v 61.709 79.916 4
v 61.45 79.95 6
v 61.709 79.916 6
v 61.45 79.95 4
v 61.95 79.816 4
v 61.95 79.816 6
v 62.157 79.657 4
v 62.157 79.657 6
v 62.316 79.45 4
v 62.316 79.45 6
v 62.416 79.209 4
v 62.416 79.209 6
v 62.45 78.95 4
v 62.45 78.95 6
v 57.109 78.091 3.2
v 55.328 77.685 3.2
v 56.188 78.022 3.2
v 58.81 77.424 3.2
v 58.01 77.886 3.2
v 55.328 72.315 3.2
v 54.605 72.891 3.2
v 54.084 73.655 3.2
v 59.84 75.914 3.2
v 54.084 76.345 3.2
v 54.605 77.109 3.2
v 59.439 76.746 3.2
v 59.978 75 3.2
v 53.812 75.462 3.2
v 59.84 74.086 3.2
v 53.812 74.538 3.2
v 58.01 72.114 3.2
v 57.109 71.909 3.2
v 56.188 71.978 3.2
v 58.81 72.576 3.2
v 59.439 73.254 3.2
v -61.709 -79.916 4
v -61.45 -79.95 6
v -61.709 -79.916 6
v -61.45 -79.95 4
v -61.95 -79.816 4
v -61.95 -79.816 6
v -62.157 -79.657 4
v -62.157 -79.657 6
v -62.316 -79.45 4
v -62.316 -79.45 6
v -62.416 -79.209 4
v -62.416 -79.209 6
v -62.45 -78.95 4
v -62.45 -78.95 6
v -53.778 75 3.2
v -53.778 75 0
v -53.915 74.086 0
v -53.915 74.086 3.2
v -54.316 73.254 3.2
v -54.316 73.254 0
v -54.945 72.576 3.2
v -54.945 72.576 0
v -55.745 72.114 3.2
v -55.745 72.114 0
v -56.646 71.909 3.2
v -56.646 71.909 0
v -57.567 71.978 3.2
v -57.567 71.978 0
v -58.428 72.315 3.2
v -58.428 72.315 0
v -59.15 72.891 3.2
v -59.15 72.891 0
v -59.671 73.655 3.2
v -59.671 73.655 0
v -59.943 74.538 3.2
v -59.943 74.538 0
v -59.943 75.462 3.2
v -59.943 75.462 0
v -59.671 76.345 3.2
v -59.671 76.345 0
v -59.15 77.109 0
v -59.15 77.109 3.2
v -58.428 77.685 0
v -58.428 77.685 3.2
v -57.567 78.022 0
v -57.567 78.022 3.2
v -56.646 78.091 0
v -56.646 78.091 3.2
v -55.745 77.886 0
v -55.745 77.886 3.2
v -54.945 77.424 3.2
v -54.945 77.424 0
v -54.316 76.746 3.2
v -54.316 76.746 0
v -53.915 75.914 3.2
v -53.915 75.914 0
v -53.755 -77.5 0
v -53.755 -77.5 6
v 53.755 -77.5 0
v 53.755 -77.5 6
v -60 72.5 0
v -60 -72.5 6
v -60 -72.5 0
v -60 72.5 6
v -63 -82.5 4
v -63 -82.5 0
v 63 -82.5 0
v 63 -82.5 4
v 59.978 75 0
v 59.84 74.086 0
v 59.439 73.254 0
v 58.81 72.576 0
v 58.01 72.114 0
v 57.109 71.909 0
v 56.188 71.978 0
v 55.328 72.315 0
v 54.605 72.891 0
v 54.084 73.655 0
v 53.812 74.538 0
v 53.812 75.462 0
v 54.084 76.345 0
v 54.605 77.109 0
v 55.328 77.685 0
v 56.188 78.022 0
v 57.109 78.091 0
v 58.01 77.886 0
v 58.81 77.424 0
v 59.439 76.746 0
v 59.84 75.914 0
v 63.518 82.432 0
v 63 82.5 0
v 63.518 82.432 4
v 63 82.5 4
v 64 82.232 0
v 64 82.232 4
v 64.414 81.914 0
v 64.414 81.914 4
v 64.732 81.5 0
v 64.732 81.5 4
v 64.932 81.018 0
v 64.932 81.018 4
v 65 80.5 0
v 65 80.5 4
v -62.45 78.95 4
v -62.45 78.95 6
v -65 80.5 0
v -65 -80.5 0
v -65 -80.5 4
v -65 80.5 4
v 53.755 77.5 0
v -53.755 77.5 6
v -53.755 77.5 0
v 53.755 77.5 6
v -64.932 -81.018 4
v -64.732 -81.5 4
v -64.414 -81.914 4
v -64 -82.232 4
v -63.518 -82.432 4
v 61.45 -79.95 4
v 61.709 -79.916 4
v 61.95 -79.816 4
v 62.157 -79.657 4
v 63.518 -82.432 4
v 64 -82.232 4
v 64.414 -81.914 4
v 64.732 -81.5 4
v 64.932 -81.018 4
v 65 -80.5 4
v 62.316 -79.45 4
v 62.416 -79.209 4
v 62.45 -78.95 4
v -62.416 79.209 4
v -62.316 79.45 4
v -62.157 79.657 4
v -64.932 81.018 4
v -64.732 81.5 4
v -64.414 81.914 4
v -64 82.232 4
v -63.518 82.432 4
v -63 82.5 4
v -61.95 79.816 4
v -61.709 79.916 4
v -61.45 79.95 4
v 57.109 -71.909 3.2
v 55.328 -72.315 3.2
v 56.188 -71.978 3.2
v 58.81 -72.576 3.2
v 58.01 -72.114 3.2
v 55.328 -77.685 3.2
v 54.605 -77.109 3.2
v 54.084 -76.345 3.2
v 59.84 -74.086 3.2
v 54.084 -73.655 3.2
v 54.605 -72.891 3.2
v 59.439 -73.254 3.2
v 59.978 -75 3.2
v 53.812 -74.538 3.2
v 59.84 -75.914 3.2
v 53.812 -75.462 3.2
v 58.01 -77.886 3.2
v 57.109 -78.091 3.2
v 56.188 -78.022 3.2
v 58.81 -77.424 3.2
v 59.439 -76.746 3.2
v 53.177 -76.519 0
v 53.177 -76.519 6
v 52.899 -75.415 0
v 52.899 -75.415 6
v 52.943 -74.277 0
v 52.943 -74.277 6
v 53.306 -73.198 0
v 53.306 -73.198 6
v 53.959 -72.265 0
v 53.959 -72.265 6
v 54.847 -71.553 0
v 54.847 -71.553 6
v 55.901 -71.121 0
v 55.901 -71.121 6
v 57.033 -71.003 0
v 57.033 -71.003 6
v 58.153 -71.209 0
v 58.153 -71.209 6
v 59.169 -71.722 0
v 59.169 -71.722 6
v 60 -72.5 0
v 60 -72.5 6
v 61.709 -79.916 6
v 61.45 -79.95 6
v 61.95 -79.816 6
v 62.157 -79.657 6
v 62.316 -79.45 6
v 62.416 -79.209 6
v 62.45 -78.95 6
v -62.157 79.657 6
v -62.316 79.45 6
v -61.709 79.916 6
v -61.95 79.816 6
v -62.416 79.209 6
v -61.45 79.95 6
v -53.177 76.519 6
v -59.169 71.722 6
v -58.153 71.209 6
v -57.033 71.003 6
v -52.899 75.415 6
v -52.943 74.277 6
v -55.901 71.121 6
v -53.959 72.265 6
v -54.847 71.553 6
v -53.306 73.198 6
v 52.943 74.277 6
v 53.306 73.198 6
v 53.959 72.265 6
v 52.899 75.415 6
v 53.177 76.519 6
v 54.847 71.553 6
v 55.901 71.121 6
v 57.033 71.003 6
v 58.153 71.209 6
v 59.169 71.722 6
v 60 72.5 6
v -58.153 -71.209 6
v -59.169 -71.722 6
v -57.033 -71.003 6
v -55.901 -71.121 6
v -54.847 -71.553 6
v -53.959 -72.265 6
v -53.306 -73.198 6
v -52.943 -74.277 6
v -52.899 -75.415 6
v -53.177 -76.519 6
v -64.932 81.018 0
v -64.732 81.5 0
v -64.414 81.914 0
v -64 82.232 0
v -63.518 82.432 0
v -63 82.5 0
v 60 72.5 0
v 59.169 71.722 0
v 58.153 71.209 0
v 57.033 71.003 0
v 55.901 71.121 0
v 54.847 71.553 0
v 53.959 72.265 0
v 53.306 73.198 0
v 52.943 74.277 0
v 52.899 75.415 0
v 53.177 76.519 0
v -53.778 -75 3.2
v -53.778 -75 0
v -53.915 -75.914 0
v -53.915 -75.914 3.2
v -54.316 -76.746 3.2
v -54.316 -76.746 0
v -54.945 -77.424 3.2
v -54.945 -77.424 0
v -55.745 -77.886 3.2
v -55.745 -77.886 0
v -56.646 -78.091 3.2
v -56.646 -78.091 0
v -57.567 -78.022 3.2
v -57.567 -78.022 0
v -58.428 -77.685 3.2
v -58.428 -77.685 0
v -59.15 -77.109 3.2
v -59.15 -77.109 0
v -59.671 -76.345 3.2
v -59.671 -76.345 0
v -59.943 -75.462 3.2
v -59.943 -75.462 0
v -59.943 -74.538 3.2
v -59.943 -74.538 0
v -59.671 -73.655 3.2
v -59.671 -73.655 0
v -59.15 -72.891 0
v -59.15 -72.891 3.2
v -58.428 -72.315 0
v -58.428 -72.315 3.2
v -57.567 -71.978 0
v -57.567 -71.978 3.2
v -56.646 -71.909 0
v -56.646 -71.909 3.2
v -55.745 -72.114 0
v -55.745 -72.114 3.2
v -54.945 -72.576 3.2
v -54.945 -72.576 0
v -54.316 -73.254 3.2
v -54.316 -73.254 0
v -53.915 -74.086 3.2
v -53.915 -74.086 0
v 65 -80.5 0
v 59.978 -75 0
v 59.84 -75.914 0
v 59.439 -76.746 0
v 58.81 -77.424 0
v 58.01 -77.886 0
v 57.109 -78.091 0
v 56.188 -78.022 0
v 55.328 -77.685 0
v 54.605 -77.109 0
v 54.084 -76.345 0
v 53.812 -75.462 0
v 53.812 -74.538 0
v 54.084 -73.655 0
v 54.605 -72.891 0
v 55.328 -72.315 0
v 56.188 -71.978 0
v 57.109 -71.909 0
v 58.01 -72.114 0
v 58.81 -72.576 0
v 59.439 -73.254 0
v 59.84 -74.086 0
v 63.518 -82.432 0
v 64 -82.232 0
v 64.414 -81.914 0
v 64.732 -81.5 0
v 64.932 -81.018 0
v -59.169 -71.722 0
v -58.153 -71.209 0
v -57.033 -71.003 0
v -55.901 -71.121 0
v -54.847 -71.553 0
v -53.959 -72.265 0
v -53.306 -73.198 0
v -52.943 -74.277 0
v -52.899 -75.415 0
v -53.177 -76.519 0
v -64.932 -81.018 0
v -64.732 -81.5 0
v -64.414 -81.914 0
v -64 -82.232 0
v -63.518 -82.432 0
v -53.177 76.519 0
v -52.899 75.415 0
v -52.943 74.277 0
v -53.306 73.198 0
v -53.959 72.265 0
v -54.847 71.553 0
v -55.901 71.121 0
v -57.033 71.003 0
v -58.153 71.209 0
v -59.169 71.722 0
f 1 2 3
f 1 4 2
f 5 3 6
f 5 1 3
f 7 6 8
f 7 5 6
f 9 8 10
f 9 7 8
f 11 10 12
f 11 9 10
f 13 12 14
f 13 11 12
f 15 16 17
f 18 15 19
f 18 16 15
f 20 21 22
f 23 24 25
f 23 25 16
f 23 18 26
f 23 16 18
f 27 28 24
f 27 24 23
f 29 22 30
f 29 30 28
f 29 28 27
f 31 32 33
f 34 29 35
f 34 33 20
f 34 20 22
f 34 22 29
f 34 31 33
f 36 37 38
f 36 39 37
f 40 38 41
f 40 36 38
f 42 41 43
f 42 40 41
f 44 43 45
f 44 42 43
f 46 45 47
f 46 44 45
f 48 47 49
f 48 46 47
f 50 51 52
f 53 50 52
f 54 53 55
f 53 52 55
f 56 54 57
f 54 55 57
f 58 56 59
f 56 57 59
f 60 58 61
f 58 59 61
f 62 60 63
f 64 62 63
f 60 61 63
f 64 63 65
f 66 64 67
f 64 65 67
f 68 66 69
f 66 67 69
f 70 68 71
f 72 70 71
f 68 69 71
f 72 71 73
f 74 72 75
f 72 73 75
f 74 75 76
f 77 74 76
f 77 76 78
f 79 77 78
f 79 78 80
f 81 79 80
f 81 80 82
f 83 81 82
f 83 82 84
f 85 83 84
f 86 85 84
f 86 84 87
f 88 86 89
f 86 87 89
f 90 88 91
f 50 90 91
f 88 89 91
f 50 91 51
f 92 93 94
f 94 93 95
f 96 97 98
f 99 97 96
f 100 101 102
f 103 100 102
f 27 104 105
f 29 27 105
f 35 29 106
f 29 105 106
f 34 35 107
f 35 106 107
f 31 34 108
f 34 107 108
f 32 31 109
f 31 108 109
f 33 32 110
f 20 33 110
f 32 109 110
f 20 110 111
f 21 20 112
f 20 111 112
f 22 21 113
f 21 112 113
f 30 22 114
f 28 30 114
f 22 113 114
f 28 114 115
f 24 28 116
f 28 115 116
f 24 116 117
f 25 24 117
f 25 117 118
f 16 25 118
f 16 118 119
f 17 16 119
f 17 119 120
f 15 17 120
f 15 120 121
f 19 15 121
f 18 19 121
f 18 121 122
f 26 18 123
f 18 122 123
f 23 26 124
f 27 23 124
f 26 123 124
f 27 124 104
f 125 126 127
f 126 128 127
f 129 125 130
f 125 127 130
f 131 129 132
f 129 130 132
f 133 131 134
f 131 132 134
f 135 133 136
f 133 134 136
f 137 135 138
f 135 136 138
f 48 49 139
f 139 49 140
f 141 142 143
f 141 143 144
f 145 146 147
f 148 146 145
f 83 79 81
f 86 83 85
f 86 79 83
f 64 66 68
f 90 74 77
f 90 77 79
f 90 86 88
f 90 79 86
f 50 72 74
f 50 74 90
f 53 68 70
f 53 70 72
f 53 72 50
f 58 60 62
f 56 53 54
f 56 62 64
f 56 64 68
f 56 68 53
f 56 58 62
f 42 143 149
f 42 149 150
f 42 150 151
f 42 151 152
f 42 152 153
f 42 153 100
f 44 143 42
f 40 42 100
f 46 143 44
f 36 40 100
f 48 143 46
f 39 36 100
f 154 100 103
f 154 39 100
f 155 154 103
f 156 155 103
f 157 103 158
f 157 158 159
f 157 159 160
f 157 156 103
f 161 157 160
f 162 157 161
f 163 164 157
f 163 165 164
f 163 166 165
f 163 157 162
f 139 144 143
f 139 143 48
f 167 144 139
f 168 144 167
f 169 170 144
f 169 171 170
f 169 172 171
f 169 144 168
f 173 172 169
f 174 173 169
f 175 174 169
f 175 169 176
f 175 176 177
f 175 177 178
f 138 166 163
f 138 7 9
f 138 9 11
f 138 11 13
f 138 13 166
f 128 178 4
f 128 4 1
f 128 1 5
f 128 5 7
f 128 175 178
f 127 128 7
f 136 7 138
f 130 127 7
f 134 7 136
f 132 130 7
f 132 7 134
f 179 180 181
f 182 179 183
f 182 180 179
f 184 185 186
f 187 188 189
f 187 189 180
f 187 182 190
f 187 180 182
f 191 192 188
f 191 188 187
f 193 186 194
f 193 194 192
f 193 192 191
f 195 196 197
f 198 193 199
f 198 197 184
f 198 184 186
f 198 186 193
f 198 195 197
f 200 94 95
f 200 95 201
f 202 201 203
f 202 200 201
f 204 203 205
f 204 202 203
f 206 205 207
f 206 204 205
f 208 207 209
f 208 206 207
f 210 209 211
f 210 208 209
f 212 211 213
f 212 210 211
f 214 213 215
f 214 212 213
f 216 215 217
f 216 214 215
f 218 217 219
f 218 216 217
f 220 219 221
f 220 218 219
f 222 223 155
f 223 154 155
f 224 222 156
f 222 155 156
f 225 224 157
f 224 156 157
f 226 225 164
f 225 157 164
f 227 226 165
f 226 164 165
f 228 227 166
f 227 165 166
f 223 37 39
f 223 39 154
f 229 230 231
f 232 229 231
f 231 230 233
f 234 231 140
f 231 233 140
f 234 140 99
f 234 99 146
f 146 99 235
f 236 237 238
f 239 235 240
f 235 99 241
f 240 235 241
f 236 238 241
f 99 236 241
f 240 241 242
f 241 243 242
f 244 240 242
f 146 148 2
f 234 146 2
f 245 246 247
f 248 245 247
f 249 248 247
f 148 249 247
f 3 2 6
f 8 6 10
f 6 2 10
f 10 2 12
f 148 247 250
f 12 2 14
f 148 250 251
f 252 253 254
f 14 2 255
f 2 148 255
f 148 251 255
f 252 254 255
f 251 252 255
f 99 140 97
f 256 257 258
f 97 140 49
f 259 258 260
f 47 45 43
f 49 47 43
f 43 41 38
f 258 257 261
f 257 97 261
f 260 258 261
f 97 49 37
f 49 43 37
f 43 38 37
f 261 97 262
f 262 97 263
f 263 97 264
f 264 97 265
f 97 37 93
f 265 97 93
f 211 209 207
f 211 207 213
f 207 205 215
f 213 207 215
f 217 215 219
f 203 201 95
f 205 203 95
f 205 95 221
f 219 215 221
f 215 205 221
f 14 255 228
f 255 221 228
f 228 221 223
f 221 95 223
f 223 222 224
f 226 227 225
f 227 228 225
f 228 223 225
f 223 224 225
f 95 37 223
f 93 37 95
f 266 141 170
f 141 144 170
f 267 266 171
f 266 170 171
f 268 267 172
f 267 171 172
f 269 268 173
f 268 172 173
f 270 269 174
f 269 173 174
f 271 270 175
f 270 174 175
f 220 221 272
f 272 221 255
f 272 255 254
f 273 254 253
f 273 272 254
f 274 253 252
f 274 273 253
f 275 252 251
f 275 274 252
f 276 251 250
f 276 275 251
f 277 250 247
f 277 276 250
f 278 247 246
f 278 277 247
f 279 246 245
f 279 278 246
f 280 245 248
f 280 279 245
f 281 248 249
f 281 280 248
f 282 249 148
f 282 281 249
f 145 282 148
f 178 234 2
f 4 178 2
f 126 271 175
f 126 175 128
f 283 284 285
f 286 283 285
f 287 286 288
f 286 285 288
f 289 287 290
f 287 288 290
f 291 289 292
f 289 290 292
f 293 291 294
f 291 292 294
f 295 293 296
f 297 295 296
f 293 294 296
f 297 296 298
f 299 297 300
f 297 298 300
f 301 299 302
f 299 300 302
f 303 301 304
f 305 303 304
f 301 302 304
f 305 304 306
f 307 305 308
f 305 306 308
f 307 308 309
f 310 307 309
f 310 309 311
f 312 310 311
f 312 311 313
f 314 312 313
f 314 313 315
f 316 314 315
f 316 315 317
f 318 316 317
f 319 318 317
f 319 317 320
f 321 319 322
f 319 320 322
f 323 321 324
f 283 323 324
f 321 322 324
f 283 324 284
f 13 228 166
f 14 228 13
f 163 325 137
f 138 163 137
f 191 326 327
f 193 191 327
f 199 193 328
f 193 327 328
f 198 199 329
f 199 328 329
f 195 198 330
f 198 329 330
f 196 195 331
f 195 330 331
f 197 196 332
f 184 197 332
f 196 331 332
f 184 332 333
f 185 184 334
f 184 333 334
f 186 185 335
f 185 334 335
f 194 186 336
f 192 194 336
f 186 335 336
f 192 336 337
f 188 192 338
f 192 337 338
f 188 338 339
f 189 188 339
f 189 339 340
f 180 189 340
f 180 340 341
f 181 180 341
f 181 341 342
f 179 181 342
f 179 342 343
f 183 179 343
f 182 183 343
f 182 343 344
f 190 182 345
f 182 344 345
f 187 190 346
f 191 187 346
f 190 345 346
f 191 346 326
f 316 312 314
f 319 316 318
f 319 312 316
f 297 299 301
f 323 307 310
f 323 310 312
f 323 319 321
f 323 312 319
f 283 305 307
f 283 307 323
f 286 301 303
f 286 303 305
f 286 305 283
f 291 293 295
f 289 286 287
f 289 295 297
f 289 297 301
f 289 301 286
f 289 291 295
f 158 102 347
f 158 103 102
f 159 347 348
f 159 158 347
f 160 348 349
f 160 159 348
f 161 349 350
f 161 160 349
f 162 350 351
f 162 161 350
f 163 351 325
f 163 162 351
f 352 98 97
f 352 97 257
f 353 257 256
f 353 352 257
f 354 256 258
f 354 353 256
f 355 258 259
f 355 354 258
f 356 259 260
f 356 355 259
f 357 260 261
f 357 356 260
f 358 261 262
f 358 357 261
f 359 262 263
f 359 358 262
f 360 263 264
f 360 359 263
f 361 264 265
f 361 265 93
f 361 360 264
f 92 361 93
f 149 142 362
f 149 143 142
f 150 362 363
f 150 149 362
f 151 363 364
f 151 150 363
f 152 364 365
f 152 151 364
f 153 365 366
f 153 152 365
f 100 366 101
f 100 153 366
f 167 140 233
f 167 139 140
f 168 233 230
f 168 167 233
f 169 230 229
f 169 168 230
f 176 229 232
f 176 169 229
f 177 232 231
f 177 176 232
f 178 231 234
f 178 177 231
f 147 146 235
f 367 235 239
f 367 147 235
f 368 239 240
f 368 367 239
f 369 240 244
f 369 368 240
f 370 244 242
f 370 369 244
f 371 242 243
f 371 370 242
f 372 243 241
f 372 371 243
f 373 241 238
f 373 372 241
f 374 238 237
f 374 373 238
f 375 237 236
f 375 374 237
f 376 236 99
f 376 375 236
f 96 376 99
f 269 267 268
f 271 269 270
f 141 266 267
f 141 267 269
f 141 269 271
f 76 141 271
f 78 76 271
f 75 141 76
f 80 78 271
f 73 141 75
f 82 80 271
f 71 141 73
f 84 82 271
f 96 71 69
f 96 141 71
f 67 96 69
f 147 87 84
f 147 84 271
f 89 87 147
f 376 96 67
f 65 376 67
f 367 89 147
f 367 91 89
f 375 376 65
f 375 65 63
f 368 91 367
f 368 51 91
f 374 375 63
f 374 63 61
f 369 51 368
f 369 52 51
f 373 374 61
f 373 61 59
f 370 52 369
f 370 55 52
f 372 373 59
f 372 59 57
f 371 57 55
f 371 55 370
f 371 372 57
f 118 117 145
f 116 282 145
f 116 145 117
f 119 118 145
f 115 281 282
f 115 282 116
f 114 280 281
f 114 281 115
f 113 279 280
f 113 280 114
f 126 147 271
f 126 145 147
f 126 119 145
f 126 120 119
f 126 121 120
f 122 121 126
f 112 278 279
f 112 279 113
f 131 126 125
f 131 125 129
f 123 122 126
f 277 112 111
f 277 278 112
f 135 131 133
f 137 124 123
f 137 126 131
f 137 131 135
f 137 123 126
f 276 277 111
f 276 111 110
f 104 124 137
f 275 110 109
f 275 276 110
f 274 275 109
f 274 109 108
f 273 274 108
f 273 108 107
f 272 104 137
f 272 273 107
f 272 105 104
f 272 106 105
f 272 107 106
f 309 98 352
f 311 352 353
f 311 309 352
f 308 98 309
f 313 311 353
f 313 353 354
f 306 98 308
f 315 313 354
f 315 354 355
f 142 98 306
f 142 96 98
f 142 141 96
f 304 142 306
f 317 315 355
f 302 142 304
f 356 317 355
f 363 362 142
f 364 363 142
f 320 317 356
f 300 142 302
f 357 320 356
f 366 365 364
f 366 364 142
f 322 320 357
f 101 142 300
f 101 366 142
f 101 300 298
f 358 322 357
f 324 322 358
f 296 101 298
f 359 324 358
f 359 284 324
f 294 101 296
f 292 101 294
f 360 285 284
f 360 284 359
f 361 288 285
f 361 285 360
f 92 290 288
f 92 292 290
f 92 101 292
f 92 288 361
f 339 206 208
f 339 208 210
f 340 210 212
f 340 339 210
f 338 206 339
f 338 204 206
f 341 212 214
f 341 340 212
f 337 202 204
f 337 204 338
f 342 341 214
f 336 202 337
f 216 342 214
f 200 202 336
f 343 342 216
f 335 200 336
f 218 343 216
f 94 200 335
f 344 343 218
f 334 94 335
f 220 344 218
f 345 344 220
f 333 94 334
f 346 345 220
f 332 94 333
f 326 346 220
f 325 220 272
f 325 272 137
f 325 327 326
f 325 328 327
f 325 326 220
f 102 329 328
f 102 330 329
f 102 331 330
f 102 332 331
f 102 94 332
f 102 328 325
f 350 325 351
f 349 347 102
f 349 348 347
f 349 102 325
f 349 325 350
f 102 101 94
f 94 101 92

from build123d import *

# Parameters (mm, degrees)
SKETCH003_W     = 130
SKETCH003_H     = 165
PAD002_DEPTH    = 6
SKETCH004_W     = 120
SKETCH004_H     = 155
POCKET001_DEPTH = 10
SKETCH007_W     = 130
SKETCH007_H     = 165
SKETCH007_W_2   = 124.9
SKETCH007_H_2   = 159.9
POCKET002_DEPTH = 2
SKETCH008_R     = 4
PAD004_DEPTH    = 6
SKETCH009_R     = 3.1
POCKET003_DEPTH = 3.2
FILLET001_R     = 2
FILLET002_R     = 1
FILLET003_R     = 1
FILLET004_R     = 1
FILLET005_R     = 1


with BuildPart() as part:
    # Sketch003 → Pad002 (new body)
    with BuildSketch(Plane.XY):
        Rectangle(SKETCH003_W, SKETCH003_H)
    extrude(amount=PAD002_DEPTH)

    # Sketch004 (on Face6 of Pad002) → Pocket001 (cut)
    with BuildSketch(Plane.XY.offset(6)):
        Rectangle(SKETCH004_W, SKETCH004_H)
    extrude(amount=-POCKET001_DEPTH, mode=Mode.SUBTRACT)

    # Sketch007 (on Face5 of Pocket001) → Pocket002 (cut)
    with BuildSketch(Plane.XY.offset(6)):
        Rectangle(SKETCH007_W, SKETCH007_H)
        Rectangle(SKETCH007_W_2, SKETCH007_H_2, mode=Mode.SUBTRACT)
    extrude(amount=-POCKET002_DEPTH, mode=Mode.SUBTRACT)

    # Sketch008 (on Face2 of Pocket002) → Pad004 (join)
    with BuildSketch(Plane(origin=(0, 0, 0), x_dir=(1, 0, 0), z_dir=(0, 0, -1))):
        with Locations((-56.877501, 75)):
            Circle(SKETCH008_R)
        with Locations((56.877501, 75)):
            Circle(SKETCH008_R)
        with Locations((-56.877501, -75)):
            Circle(SKETCH008_R)
        with Locations((56.877501, -75)):
            Circle(SKETCH008_R)
    extrude(amount=-PAD004_DEPTH)

    # Sketch009 (on Face10 of Pad004) → Pocket003 (cut)
    with BuildSketch(Plane(origin=(0, 0, 0), x_dir=(1, 0, 0), z_dir=(0, 0, -1))):
        with Locations((-56.877501, 75)):
            Circle(SKETCH009_R)
        with Locations((56.877501, 75)):
            Circle(SKETCH009_R)
        with Locations((-56.877501, -75)):
            Circle(SKETCH009_R)
        with Locations((56.877501, -75)):
            Circle(SKETCH009_R)
    extrude(amount=-POCKET003_DEPTH, mode=Mode.SUBTRACT)

    # Fillet001
    fillet001_edges = [part.edges().sort_by_distance(p)[0] for p in [
        (65, -82.5, 2),
        (-65, -82.5, 2),
        (-65, 82.5, 2),
        (65, 82.5, 2),
    ]]
    fillet(fillet001_edges, radius=FILLET001_R)

    # Fillet002
    fillet002_edges = [part.edges().sort_by_distance(p)[0] for p in [
        (62.45, -79.95, 5),
    ]]
    fillet(fillet002_edges, radius=FILLET002_R)

    # Fillet003
    fillet003_edges = [part.edges().sort_by_distance(p)[0] for p in [
        (-62.45, -79.95, 5),
    ]]
    fillet(fillet003_edges, radius=FILLET003_R)

    # Fillet004
    fillet004_edges = [part.edges().sort_by_distance(p)[0] for p in [
        (-62.45, 79.95, 5),
    ]]
    fillet(fillet004_edges, radius=FILLET004_R)

    # Fillet005
    fillet005_edges = [part.edges().sort_by_distance(p)[0] for p in [
        (62.45, 79.95, 5),
    ]]
    fillet(fillet005_edges, radius=FILLET005_R)


solid = part.part
